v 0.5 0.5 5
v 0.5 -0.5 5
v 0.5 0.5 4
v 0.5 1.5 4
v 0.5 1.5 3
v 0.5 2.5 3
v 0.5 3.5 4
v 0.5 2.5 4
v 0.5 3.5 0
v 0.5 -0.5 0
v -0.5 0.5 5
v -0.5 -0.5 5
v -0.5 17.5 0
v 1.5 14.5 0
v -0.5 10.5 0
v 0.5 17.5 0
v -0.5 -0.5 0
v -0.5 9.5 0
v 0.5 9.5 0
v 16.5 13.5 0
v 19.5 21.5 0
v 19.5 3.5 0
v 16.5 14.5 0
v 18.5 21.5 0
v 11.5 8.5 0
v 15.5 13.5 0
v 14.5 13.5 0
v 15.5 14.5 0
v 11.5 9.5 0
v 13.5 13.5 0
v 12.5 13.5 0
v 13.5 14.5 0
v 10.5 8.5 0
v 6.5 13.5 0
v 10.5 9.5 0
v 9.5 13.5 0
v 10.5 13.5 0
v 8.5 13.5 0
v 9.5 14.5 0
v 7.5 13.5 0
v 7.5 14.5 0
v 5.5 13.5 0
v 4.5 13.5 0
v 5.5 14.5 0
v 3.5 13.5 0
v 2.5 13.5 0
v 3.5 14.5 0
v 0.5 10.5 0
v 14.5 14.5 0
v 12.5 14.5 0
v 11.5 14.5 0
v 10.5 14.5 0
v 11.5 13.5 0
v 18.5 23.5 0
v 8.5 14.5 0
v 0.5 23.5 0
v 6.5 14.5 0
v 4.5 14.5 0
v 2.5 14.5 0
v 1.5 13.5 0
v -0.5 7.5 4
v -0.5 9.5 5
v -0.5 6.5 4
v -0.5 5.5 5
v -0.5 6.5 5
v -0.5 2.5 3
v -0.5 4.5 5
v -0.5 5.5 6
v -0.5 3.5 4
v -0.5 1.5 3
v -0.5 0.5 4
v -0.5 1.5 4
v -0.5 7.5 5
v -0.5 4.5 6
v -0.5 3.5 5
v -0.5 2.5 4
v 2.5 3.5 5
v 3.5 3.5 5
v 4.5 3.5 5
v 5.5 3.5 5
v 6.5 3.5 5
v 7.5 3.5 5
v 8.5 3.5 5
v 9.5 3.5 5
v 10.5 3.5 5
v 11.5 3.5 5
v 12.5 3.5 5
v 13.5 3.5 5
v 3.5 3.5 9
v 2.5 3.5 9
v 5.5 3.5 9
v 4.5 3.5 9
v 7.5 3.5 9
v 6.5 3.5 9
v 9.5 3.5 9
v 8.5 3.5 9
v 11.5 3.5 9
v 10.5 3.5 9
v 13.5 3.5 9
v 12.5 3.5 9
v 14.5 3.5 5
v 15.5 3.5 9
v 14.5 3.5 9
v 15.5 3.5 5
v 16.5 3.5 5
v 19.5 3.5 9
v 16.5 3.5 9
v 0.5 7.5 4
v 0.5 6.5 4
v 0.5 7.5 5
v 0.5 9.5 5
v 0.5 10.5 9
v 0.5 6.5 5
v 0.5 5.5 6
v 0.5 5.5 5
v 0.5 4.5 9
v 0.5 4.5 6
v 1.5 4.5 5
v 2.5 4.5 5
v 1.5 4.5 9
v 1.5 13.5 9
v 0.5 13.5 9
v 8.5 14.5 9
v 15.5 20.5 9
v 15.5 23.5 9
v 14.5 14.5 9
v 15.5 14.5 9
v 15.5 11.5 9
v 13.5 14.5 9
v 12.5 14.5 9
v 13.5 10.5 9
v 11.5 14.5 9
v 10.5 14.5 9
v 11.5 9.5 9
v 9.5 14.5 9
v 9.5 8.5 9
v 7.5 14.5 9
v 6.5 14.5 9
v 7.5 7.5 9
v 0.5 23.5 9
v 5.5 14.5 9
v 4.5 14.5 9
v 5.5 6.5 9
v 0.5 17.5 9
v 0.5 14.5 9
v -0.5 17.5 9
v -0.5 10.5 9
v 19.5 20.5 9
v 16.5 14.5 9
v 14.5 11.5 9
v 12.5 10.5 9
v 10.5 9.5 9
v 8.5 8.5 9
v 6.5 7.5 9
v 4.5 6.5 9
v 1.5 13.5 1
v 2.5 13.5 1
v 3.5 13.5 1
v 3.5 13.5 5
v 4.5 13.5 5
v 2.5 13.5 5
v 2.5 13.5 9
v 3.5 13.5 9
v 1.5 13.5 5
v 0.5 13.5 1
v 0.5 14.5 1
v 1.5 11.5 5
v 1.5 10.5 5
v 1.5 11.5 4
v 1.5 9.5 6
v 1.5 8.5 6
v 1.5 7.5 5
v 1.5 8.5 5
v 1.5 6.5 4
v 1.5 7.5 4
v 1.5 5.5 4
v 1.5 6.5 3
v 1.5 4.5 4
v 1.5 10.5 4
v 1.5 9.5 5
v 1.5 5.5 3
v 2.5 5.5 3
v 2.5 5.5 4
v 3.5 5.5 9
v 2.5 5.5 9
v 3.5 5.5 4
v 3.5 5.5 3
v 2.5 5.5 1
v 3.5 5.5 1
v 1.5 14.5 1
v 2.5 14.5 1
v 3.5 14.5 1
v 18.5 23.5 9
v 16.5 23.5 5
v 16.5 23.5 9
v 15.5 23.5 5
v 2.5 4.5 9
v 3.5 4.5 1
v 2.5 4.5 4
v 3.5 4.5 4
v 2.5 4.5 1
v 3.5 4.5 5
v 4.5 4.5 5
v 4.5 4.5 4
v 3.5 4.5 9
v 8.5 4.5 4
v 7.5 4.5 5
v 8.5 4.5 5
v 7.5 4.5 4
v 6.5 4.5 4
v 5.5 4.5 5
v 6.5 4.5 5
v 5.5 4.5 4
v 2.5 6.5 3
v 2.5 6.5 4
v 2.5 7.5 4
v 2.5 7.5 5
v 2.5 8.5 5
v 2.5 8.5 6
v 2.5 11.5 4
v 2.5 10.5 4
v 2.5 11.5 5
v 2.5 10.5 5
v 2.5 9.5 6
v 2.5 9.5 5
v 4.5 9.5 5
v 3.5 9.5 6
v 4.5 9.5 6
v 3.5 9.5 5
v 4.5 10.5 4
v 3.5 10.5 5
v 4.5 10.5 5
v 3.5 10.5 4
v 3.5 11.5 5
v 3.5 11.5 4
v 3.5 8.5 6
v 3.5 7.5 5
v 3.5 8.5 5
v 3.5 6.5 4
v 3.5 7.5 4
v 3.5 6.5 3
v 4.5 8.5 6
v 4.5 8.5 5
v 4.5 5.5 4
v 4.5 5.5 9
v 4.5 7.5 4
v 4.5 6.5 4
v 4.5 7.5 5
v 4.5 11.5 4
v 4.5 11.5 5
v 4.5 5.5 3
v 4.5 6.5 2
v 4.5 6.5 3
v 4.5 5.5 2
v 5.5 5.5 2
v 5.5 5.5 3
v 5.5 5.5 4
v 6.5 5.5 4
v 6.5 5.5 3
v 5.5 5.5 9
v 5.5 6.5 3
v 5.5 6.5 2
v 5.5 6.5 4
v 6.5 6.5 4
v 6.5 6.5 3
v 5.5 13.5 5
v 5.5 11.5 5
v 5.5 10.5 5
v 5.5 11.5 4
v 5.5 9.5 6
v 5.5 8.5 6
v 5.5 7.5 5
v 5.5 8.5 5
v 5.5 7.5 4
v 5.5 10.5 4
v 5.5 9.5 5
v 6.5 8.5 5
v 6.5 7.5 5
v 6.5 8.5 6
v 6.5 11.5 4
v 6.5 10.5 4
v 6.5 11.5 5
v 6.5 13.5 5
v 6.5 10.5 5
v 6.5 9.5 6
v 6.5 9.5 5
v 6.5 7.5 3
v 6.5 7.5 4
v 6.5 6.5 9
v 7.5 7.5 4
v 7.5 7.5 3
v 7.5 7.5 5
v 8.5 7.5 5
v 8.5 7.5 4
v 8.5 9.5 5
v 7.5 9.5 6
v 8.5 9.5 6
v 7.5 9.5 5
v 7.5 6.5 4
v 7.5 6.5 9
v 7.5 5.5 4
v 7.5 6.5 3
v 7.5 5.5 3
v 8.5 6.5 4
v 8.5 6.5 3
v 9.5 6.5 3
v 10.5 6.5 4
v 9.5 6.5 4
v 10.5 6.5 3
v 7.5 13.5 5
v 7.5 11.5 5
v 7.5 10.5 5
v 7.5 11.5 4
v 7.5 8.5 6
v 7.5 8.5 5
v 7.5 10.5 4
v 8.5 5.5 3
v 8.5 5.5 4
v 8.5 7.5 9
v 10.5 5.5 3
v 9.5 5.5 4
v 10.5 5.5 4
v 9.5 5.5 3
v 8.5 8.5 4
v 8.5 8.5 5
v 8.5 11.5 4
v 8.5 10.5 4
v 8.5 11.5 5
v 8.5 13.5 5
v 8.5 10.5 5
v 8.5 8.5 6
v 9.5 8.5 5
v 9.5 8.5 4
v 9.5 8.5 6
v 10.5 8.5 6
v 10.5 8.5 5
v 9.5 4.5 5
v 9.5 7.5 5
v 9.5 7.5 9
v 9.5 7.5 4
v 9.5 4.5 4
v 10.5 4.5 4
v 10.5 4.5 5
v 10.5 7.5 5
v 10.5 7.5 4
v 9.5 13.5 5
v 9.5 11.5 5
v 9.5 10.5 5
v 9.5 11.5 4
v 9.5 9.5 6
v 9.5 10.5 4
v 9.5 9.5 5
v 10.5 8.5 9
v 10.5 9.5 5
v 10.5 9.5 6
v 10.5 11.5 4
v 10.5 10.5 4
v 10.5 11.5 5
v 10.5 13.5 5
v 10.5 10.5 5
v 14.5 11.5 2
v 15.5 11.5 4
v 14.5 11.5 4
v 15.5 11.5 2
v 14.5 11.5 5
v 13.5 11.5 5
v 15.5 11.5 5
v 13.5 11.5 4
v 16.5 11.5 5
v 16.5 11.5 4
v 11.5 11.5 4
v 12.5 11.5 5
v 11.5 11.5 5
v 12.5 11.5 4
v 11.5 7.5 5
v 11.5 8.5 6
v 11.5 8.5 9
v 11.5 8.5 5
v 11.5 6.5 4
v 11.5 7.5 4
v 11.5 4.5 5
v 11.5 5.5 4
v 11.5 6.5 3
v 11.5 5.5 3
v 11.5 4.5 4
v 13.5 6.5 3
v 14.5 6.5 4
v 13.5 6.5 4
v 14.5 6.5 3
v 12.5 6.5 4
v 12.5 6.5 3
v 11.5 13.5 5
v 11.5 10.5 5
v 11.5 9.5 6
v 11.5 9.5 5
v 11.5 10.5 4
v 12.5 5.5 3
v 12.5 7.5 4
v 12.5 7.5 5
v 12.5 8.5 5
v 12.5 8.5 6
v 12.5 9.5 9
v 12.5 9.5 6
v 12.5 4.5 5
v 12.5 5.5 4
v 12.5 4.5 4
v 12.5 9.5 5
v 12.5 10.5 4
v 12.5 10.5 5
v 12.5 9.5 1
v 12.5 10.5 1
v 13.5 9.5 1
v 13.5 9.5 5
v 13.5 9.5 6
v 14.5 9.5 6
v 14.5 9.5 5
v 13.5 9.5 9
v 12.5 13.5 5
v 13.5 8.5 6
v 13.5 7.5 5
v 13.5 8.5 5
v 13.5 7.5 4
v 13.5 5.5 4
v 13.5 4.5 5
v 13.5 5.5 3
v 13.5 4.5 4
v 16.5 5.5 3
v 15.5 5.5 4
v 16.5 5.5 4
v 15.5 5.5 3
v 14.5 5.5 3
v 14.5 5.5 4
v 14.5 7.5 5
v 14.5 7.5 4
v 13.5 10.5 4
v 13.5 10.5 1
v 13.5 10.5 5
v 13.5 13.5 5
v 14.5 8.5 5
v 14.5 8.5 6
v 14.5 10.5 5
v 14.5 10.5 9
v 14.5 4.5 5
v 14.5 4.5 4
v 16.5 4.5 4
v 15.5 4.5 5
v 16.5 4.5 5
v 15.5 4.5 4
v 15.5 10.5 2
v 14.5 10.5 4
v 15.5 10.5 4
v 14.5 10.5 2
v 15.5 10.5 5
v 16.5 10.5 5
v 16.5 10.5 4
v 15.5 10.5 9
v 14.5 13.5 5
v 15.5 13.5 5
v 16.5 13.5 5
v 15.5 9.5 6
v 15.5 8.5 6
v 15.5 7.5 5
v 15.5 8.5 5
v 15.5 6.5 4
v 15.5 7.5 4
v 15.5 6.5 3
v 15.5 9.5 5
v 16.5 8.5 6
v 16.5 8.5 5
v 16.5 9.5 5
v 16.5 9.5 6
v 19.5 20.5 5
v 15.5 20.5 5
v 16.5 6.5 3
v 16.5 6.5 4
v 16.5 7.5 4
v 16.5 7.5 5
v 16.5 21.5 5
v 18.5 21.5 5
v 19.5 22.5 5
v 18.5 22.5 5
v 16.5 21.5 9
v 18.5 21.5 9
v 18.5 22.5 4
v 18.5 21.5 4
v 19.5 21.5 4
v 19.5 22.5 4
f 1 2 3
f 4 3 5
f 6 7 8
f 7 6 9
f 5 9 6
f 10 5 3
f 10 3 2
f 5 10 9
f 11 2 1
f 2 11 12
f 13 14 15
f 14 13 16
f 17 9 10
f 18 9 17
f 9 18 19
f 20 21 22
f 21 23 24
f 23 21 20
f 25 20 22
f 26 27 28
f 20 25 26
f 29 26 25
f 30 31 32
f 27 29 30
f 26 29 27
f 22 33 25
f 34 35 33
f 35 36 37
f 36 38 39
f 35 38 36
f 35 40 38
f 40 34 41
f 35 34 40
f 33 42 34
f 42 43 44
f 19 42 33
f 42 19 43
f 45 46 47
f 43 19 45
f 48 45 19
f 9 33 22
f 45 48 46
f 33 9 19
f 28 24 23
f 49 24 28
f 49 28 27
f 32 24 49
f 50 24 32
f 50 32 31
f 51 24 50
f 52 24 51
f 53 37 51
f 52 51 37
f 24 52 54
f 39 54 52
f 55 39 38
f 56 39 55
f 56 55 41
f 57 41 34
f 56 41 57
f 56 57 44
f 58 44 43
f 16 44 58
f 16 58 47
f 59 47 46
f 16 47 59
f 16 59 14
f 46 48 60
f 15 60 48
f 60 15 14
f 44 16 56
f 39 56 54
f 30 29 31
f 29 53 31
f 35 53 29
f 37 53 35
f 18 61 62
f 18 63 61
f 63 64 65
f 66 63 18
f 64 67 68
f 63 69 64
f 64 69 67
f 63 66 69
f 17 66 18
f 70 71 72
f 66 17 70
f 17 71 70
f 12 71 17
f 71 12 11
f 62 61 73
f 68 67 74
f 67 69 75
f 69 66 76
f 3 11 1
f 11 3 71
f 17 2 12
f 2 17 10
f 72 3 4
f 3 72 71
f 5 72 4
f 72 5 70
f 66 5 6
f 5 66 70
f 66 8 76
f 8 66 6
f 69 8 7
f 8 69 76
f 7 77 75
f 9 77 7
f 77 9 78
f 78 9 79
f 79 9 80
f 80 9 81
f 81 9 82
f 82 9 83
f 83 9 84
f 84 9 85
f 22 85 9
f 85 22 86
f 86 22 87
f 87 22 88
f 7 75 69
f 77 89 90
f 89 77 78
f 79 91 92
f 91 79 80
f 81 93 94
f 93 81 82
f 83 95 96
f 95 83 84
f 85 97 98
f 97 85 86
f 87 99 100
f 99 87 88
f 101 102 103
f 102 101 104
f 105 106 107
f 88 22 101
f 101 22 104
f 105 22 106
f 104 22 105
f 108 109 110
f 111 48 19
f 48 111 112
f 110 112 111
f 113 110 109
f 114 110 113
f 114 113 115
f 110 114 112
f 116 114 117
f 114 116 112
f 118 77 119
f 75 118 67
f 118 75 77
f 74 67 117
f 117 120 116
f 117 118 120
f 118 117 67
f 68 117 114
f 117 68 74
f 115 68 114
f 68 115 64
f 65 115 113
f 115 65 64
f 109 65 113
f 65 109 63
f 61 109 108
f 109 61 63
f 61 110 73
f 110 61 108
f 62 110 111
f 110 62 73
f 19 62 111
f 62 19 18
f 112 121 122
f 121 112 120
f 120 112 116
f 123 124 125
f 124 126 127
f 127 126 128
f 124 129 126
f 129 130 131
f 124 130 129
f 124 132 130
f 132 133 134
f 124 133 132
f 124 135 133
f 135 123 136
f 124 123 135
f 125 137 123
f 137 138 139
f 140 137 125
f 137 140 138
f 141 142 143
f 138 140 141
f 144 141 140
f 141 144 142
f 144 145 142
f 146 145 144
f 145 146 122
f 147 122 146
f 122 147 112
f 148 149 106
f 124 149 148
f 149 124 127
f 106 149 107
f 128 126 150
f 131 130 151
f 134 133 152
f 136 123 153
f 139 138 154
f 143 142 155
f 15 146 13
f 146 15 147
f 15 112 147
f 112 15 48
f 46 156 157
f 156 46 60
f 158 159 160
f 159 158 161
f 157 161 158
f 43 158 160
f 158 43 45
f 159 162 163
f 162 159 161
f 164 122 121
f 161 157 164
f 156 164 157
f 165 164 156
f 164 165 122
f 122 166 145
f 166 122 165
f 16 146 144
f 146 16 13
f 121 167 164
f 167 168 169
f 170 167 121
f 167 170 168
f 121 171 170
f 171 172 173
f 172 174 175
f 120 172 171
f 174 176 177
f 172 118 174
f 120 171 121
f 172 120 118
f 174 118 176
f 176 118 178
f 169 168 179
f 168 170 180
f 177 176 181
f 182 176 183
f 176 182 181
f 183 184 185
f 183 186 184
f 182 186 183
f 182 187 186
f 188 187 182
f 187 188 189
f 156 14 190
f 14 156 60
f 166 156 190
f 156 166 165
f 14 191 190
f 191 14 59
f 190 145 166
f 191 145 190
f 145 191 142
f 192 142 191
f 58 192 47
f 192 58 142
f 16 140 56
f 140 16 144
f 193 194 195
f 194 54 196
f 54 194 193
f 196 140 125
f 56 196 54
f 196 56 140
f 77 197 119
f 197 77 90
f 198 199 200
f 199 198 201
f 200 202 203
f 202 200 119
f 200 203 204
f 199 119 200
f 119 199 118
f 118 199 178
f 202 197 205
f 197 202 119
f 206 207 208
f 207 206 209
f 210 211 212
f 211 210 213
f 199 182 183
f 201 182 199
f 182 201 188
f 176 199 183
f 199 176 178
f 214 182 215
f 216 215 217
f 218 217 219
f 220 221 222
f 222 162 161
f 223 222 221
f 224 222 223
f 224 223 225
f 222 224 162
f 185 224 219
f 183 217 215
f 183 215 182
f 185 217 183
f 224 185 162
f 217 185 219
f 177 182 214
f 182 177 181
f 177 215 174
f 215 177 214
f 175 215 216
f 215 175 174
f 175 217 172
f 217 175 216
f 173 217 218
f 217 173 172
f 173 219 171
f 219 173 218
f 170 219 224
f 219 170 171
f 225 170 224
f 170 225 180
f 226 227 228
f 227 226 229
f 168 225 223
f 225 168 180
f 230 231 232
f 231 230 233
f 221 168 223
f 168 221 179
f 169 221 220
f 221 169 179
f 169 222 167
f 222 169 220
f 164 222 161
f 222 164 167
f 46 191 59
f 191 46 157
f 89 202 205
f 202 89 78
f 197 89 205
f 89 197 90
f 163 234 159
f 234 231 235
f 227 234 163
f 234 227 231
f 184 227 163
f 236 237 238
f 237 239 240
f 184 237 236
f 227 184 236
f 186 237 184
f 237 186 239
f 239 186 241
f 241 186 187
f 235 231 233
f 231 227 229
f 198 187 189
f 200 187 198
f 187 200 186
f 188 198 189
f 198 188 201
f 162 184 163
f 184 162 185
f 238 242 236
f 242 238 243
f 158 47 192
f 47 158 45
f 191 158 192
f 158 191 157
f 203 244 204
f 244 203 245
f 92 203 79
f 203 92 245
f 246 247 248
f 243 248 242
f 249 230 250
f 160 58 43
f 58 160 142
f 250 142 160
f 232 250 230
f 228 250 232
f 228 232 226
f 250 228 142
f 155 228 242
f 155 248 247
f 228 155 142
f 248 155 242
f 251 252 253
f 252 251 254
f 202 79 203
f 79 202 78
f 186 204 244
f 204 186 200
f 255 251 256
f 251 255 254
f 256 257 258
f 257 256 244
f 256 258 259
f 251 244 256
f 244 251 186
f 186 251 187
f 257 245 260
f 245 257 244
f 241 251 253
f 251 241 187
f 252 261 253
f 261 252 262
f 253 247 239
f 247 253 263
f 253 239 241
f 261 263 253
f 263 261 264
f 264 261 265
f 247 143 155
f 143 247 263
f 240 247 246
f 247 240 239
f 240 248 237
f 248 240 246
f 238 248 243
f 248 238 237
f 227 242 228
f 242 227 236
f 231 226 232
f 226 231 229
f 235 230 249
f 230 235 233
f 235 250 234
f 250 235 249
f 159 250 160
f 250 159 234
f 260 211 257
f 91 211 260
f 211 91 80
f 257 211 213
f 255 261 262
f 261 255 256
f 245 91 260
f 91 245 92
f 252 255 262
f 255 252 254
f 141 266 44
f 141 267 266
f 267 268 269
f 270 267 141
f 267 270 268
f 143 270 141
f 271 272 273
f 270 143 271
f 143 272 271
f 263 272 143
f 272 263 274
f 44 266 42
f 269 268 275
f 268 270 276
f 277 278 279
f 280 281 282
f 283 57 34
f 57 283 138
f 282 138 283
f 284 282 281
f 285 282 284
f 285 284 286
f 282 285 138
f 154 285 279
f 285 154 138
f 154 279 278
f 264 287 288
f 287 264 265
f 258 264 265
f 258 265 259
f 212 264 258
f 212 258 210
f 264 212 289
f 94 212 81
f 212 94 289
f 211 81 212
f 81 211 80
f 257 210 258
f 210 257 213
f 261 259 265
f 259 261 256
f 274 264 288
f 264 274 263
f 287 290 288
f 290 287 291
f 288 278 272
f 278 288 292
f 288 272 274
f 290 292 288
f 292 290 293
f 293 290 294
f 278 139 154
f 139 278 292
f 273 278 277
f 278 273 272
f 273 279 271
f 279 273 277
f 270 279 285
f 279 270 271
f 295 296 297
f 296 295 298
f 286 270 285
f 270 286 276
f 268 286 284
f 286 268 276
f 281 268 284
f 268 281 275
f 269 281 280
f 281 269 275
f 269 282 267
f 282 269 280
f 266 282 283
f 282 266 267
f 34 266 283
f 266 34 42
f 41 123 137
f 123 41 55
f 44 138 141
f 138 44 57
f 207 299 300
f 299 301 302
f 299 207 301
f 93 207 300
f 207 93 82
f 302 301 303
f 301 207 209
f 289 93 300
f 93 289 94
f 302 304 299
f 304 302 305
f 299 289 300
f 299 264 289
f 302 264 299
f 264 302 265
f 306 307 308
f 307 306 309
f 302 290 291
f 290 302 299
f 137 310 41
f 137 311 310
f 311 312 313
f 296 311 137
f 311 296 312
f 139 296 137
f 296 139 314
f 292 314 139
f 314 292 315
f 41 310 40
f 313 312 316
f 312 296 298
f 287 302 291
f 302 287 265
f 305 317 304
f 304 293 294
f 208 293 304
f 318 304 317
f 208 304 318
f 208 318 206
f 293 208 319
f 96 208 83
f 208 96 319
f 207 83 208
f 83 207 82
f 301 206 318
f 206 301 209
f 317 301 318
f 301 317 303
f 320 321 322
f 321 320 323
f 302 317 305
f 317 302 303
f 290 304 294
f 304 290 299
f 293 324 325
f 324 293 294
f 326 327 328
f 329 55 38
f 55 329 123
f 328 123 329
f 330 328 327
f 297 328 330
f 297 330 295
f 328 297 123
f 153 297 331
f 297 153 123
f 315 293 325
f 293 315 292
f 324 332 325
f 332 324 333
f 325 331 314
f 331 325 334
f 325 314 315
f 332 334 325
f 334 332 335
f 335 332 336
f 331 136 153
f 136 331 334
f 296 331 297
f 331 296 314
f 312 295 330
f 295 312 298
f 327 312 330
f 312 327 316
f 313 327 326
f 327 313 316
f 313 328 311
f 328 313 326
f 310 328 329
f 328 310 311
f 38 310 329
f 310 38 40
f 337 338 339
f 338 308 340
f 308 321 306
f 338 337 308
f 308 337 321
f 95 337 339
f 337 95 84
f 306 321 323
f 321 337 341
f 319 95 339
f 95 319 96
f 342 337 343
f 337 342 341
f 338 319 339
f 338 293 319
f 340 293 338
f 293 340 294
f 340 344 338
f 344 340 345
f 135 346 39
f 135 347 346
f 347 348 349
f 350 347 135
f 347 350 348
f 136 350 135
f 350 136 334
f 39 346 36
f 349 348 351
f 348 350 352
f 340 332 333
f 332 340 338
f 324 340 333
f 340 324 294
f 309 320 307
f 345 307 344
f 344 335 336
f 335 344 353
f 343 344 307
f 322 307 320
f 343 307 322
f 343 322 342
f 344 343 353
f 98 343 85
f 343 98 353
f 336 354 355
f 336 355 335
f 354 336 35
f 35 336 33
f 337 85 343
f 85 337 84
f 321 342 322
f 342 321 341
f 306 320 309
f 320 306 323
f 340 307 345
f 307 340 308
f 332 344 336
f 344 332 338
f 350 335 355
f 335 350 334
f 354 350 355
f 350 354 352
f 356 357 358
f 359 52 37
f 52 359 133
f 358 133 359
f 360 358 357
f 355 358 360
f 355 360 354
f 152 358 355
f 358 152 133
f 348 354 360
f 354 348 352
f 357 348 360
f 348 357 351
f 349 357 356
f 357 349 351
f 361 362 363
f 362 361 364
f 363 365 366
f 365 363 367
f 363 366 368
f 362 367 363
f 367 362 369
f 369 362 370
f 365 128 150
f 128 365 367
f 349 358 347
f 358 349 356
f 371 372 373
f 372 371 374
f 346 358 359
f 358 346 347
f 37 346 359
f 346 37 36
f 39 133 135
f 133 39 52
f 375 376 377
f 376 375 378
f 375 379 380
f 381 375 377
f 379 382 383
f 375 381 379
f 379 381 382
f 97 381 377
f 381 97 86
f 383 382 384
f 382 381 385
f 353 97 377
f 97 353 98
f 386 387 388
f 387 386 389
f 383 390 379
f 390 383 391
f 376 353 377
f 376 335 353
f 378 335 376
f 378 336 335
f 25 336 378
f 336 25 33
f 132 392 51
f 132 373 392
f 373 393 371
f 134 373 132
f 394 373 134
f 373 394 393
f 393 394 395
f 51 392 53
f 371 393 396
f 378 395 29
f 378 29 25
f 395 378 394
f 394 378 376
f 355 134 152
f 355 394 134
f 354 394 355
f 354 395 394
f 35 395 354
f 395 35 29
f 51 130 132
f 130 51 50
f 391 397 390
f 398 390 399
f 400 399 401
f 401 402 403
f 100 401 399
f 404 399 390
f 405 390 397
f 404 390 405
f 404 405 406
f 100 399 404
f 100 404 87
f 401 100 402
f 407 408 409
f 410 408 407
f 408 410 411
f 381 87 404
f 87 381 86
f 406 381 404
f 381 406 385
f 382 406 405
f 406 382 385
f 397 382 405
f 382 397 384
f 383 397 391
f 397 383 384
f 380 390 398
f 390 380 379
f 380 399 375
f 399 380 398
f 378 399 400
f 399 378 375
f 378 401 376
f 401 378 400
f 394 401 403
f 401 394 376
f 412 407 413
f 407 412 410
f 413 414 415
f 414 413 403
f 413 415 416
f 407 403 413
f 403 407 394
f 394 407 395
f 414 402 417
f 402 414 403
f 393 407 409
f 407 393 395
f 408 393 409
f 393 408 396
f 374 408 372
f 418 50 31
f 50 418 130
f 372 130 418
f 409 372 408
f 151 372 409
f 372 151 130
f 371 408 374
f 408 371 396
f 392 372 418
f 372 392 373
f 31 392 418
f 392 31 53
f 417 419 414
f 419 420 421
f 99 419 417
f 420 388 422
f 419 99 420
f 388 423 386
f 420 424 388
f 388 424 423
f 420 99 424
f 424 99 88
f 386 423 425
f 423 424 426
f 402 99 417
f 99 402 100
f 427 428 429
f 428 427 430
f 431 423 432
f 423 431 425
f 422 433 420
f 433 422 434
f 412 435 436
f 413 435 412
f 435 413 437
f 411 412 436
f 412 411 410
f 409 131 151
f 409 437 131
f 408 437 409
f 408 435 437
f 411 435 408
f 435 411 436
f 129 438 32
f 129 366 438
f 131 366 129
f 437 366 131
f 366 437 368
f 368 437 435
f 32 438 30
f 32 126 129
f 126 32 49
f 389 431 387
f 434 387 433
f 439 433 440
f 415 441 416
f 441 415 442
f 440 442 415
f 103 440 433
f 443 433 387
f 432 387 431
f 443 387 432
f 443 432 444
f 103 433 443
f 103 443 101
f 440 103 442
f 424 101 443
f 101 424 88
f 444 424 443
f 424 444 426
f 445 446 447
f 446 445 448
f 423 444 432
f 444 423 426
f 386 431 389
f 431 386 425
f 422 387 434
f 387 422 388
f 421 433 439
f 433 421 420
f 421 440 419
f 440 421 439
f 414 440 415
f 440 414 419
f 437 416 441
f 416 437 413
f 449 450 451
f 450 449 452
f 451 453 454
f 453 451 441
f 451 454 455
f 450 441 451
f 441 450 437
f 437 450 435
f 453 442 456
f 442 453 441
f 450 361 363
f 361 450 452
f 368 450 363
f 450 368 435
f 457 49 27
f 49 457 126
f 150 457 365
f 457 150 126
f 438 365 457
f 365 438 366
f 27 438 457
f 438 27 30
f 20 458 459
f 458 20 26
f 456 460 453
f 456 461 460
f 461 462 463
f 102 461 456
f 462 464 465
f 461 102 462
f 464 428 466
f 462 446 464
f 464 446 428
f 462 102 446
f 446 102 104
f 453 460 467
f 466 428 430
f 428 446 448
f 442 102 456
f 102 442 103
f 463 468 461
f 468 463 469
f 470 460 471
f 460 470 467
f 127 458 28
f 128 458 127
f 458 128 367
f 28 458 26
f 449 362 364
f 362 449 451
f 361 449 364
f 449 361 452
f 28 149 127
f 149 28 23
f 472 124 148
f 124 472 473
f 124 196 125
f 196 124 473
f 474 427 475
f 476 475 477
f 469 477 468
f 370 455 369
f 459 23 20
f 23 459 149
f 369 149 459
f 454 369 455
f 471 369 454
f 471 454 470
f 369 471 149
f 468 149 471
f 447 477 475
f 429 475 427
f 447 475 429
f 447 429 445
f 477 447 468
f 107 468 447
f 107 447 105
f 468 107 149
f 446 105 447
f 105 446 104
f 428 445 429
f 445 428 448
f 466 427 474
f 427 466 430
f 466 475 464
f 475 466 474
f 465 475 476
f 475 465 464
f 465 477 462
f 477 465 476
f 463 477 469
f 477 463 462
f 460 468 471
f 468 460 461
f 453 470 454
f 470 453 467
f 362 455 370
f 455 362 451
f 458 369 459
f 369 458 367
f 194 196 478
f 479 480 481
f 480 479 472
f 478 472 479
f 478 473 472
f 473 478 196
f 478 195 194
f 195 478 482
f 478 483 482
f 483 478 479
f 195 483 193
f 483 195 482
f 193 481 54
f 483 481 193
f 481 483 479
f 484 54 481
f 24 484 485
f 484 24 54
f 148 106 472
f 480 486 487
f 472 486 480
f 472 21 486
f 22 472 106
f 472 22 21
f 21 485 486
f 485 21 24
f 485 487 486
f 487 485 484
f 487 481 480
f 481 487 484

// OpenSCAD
union() {
    translate([0, 0, 2.5]) cube([1, 1, 5], center=true);
    translate([0, 1, 2.0]) cube([1, 1, 4], center=true);
    translate([0, 2, 1.5]) cube([1, 1, 3], center=true);
    translate([0, 3, 2.0]) cube([1, 1, 4], center=true);
    translate([0, 4, 2.5]) cube([1, 1, 5], center=true);
    translate([0, 5, 3.0]) cube([1, 1, 6], center=true);
    translate([0, 6, 2.5]) cube([1, 1, 5], center=true);
    translate([0, 7, 2.0]) cube([1, 1, 4], center=true);
    translate([0, 8, 2.5]) cube([1, 1, 5], center=true);
    translate([0, 9, 2.5]) cube([1, 1, 5], center=true);
    translate([0, 11, 4.5]) cube([1, 1, 9], center=true);
    translate([0, 12, 4.5]) cube([1, 1, 9], center=true);
    translate([0, 13, 4.5]) cube([1, 1, 9], center=true);
    translate([0, 14, 4.5]) cube([1, 1, 9], center=true);
    translate([0, 15, 4.5]) cube([1, 1, 9], center=true);
    translate([0, 16, 4.5]) cube([1, 1, 9], center=true);
    translate([0, 17, 4.5]) cube([1, 1, 9], center=true);
    translate([1, 4, 2.5]) cube([1, 1, 5], center=true);
    translate([1, 5, 4.5]) cube([1, 1, 9], center=true);
    translate([1, 6, 4.5]) cube([1, 1, 9], center=true);
    translate([1, 7, 4.5]) cube([1, 1, 9], center=true);
    translate([1, 8, 4.5]) cube([1, 1, 9], center=true);
    translate([1, 9, 4.5]) cube([1, 1, 9], center=true);
    translate([1, 10, 4.5]) cube([1, 1, 9], center=true);
    translate([1, 11, 4.5]) cube([1, 1, 9], center=true);
    translate([1, 12, 4.5]) cube([1, 1, 9], center=true);
    translate([1, 13, 4.5]) cube([1, 1, 9], center=true);
    translate([1, 14, 0.5]) cube([1, 1, 1], center=true);
    translate([1, 15, 4.5]) cube([1, 1, 9], center=true);
    translate([1, 16, 4.5]) cube([1, 1, 9], center=true);
    translate([1, 17, 4.5]) cube([1, 1, 9], center=true);
    translate([1, 18, 4.5]) cube([1, 1, 9], center=true);
    translate([1, 19, 4.5]) cube([1, 1, 9], center=true);
    translate([1, 20, 4.5]) cube([1, 1, 9], center=true);
    translate([1, 21, 4.5]) cube([1, 1, 9], center=true);
    translate([1, 22, 4.5]) cube([1, 1, 9], center=true);
    translate([1, 23, 4.5]) cube([1, 1, 9], center=true);
    translate([2, 4, 2.5]) cube([1, 1, 5], center=true);
    translate([2, 5, 2.0]) cube([1, 1, 4], center=true);
    translate([2, 6, 1.5]) cube([1, 1, 3], center=true);
    translate([2, 7, 2.0]) cube([1, 1, 4], center=true);
    translate([2, 8, 2.5]) cube([1, 1, 5], center=true);
    translate([2, 9, 3.0]) cube([1, 1, 6], center=true);
    translate([2, 10, 2.5]) cube([1, 1, 5], center=true);
    translate([2, 11, 2.0]) cube([1, 1, 4], center=true);
    translate([2, 12, 2.5]) cube([1, 1, 5], center=true);
    translate([2, 13, 2.5]) cube([1, 1, 5], center=true);
    translate([2, 15, 4.5]) cube([1, 1, 9], center=true);
    translate([2, 16, 4.5]) cube([1, 1, 9], center=true);
    translate([2, 17, 4.5]) cube([1, 1, 9], center=true);
    translate([2, 18, 4.5]) cube([1, 1, 9], center=true);
    translate([2, 19, 4.5]) cube([1, 1, 9], center=true);
    translate([2, 20, 4.5]) cube([1, 1, 9], center=true);
    translate([2, 21, 4.5]) cube([1, 1, 9], center=true);
    translate([2, 22, 4.5]) cube([1, 1, 9], center=true);
    translate([2, 23, 4.5]) cube([1, 1, 9], center=true);
    translate([3, 4, 4.5]) cube([1, 1, 9], center=true);
    translate([3, 5, 0.5]) cube([1, 1, 1], center=true);
    translate([3, 6, 4.5]) cube([1, 1, 9], center=true);
    translate([3, 7, 4.5]) cube([1, 1, 9], center=true);
    translate([3, 8, 4.5]) cube([1, 1, 9], center=true);
    translate([3, 9, 4.5]) cube([1, 1, 9], center=true);
    translate([3, 10, 4.5]) cube([1, 1, 9], center=true);
    translate([3, 11, 4.5]) cube([1, 1, 9], center=true);
    translate([3, 12, 4.5]) cube([1, 1, 9], center=true);
    translate([3, 13, 4.5]) cube([1, 1, 9], center=true);
    translate([3, 14, 0.5]) cube([1, 1, 1], center=true);
    translate([3, 15, 4.5]) cube([1, 1, 9], center=true);
    translate([3, 16, 4.5]) cube([1, 1, 9], center=true);
    translate([3, 17, 4.5]) cube([1, 1, 9], center=true);
    translate([3, 18, 4.5]) cube([1, 1, 9], center=true);
    translate([3, 19, 4.5]) cube([1, 1, 9], center=true);
    translate([3, 20, 4.5]) cube([1, 1, 9], center=true);
    translate([3, 21, 4.5]) cube([1, 1, 9], center=true);
    translate([3, 22, 4.5]) cube([1, 1, 9], center=true);
    translate([3, 23, 4.5]) cube([1, 1, 9], center=true);
    translate([4, 4, 2.5]) cube([1, 1, 5], center=true);
    translate([4, 5, 2.0]) cube([1, 1, 4], center=true);
    translate([4, 6, 1.5]) cube([1, 1, 3], center=true);
    translate([4, 7, 2.0]) cube([1, 1, 4], center=true);
    translate([4, 8, 2.5]) cube([1, 1, 5], center=true);
    translate([4, 9, 3.0]) cube([1, 1, 6], center=true);
    translate([4, 10, 2.5]) cube([1, 1, 5], center=true);
    translate([4, 11, 2.0]) cube([1, 1, 4], center=true);
    translate([4, 12, 2.5]) cube([1, 1, 5], center=true);
    translate([4, 13, 2.5]) cube([1, 1, 5], center=true);
    translate([4, 15, 4.5]) cube([1, 1, 9], center=true);
    translate([4, 16, 4.5]) cube([1, 1, 9], center=true);
    translate([4, 17, 4.5]) cube([1, 1, 9], center=true);
    translate([4, 18, 4.5]) cube([1, 1, 9], center=true);
    translate([4, 19, 4.5]) cube([1, 1, 9], center=true);
    translate([4, 20, 4.5]) cube([1, 1, 9], center=true);
    translate([4, 21, 4.5]) cube([1, 1, 9], center=true);
    translate([4, 22, 4.5]) cube([1, 1, 9], center=true);
    translate([4, 23, 4.5]) cube([1, 1, 9], center=true);
    translate([5, 4, 4.5]) cube([1, 1, 9], center=true);
    translate([5, 5, 4.5]) cube([1, 1, 9], center=true);
    translate([5, 6, 1.0]) cube([1, 1, 2], center=true);
    translate([5, 7, 4.5]) cube([1, 1, 9], center=true);
    translate([5, 8, 4.5]) cube([1, 1, 9], center=true);
    translate([5, 9, 4.5]) cube([1, 1, 9], center=true);
    translate([5, 10, 4.5]) cube([1, 1, 9], center=true);
    translate([5, 11, 4.5]) cube([1, 1, 9], center=true);
    translate([5, 12, 4.5]) cube([1, 1, 9], center=true);
    translate([5, 13, 4.5]) cube([1, 1, 9], center=true);
    translate([5, 14, 4.5]) cube([1, 1, 9], center=true);
    translate([5, 15, 4.5]) cube([1, 1, 9], center=true);
    translate([5, 16, 4.5]) cube([1, 1, 9], center=true);
    translate([5, 17, 4.5]) cube([1, 1, 9], center=true);
    translate([5, 18, 4.5]) cube([1, 1, 9], center=true);
    translate([5, 19, 4.5]) cube([1, 1, 9], center=true);
    translate([5, 20, 4.5]) cube([1, 1, 9], center=true);
    translate([5, 21, 4.5]) cube([1, 1, 9], center=true);
    translate([5, 22, 4.5]) cube([1, 1, 9], center=true);
    translate([5, 23, 4.5]) cube([1, 1, 9], center=true);
    translate([6, 4, 2.5]) cube([1, 1, 5], center=true);
    translate([6, 5, 2.0]) cube([1, 1, 4], center=true);
    translate([6, 6, 1.5]) cube([1, 1, 3], center=true);
    translate([6, 7, 2.0]) cube([1, 1, 4], center=true);
    translate([6, 8, 2.5]) cube([1, 1, 5], center=true);
    translate([6, 9, 3.0]) cube([1, 1, 6], center=true);
    translate([6, 10, 2.5]) cube([1, 1, 5], center=true);
    translate([6, 11, 2.0]) cube([1, 1, 4], center=true);
    translate([6, 12, 2.5]) cube([1, 1, 5], center=true);
    translate([6, 13, 2.5]) cube([1, 1, 5], center=true);
    translate([6, 15, 4.5]) cube([1, 1, 9], center=true);
    translate([6, 16, 4.5]) cube([1, 1, 9], center=true);
    translate([6, 17, 4.5]) cube([1, 1, 9], center=true);
    translate([6, 18, 4.5]) cube([1, 1, 9], center=true);
    translate([6, 19, 4.5]) cube([1, 1, 9], center=true);
    translate([6, 20, 4.5]) cube([1, 1, 9], center=true);
    translate([6, 21, 4.5]) cube([1, 1, 9], center=true);
    translate([6, 22, 4.5]) cube([1, 1, 9], center=true);
    translate([6, 23, 4.5]) cube([1, 1, 9], center=true);
    translate([7, 4, 4.5]) cube([1, 1, 9], center=true);
    translate([7, 5, 4.5]) cube([1, 1, 9], center=true);
    translate([7, 6, 4.5]) cube([1, 1, 9], center=true);
    translate([7, 7, 1.5]) cube([1, 1, 3], center=true);
    translate([7, 8, 4.5]) cube([1, 1, 9], center=true);
    translate([7, 9, 4.5]) cube([1, 1, 9], center=true);
    translate([7, 10, 4.5]) cube([1, 1, 9], center=true);
    translate([7, 11, 4.5]) cube([1, 1, 9], center=true);
    translate([7, 12, 4.5]) cube([1, 1, 9], center=true);
    translate([7, 13, 4.5]) cube([1, 1, 9], center=true);
    translate([7, 14, 4.5]) cube([1, 1, 9], center=true);
    translate([7, 15, 4.5]) cube([1, 1, 9], center=true);
    translate([7, 16, 4.5]) cube([1, 1, 9], center=true);
    translate([7, 17, 4.5]) cube([1, 1, 9], center=true);
    translate([7, 18, 4.5]) cube([1, 1, 9], center=true);
    translate([7, 19, 4.5]) cube([1, 1, 9], center=true);
    translate([7, 20, 4.5]) cube([1, 1, 9], center=true);
    translate([7, 21, 4.5]) cube([1, 1, 9], center=true);
    translate([7, 22, 4.5]) cube([1, 1, 9], center=true);
    translate([7, 23, 4.5]) cube([1, 1, 9], center=true);
    translate([8, 4, 2.5]) cube([1, 1, 5], center=true);
    translate([8, 5, 2.0]) cube([1, 1, 4], center=true);
    translate([8, 6, 1.5]) cube([1, 1, 3], center=true);
    translate([8, 7, 2.0]) cube([1, 1, 4], center=true);
    translate([8, 8, 2.5]) cube([1, 1, 5], center=true);
    translate([8, 9, 3.0]) cube([1, 1, 6], center=true);
    translate([8, 10, 2.5]) cube([1, 1, 5], center=true);
    translate([8, 11, 2.0]) cube([1, 1, 4], center=true);
    translate([8, 12, 2.5]) cube([1, 1, 5], center=true);
    translate([8, 13, 2.5]) cube([1, 1, 5], center=true);
    translate([8, 15, 4.5]) cube([1, 1, 9], center=true);
    translate([8, 16, 4.5]) cube([1, 1, 9], center=true);
    translate([8, 17, 4.5]) cube([1, 1, 9], center=true);
    translate([8, 18, 4.5]) cube([1, 1, 9], center=true);
    translate([8, 19, 4.5]) cube([1, 1, 9], center=true);
    translate([8, 20, 4.5]) cube([1, 1, 9], center=true);
    translate([8, 21, 4.5]) cube([1, 1, 9], center=true);
    translate([8, 22, 4.5]) cube([1, 1, 9], center=true);
    translate([8, 23, 4.5]) cube([1, 1, 9], center=true);
    translate([9, 4, 4.5]) cube([1, 1, 9], center=true);
    translate([9, 5, 4.5]) cube([1, 1, 9], center=true);
    translate([9, 6, 4.5]) cube([1, 1, 9], center=true);
    translate([9, 7, 4.5]) cube([1, 1, 9], center=true);
    translate([9, 8, 2.0]) cube([1, 1, 4], center=true);
    translate([9, 9, 4.5]) cube([1, 1, 9], center=true);
    translate([9, 10, 4.5]) cube([1, 1, 9], center=true);
    translate([9, 11, 4.5]) cube([1, 1, 9], center=true);
    translate([9, 12, 4.5]) cube([1, 1, 9], center=true);
    translate([9, 13, 4.5]) cube([1, 1, 9], center=true);
    translate([9, 14, 4.5]) cube([1, 1, 9], center=true);
    translate([9, 15, 4.5]) cube([1, 1, 9], center=true);
    translate([9, 16, 4.5]) cube([1, 1, 9], center=true);
    translate([9, 17, 4.5]) cube([1, 1, 9], center=true);
    translate([9, 18, 4.5]) cube([1, 1, 9], center=true);
    translate([9, 19, 4.5]) cube([1, 1, 9], center=true);
    translate([9, 20, 4.5]) cube([1, 1, 9], center=true);
    translate([9, 21, 4.5]) cube([1, 1, 9], center=true);
    translate([9, 22, 4.5]) cube([1, 1, 9], center=true);
    translate([9, 23, 4.5]) cube([1, 1, 9], center=true);
    translate([10, 4, 2.5]) cube([1, 1, 5], center=true);
    translate([10, 5, 2.0]) cube([1, 1, 4], center=true);
    translate([10, 6, 1.5]) cube([1, 1, 3], center=true);
    translate([10, 7, 2.0]) cube([1, 1, 4], center=true);
    translate([10, 8, 2.5]) cube([1, 1, 5], center=true);
    translate([10, 9, 3.0]) cube([1, 1, 6], center=true);
    translate([10, 10, 2.5]) cube([1, 1, 5], center=true);
    translate([10, 11, 2.0]) cube([1, 1, 4], center=true);
    translate([10, 12, 2.5]) cube([1, 1, 5], center=true);
    translate([10, 13, 2.5]) cube([1, 1, 5], center=true);
    translate([10, 15, 4.5]) cube([1, 1, 9], center=true);
    translate([10, 16, 4.5]) cube([1, 1, 9], center=true);
    translate([10, 17, 4.5]) cube([1, 1, 9], center=true);
    translate([10, 18, 4.5]) cube([1, 1, 9], center=true);
    translate([10, 19, 4.5]) cube([1, 1, 9], center=true);
    translate([10, 20, 4.5]) cube([1, 1, 9], center=true);
    translate([10, 21, 4.5]) cube([1, 1, 9], center=true);
    translate([10, 22, 4.5]) cube([1, 1, 9], center=true);
    translate([10, 23, 4.5]) cube([1, 1, 9], center=true);
    translate([11, 4, 4.5]) cube([1, 1, 9], center=true);
    translate([11, 5, 4.5]) cube([1, 1, 9], center=true);
    translate([11, 6, 4.5]) cube([1, 1, 9], center=true);
    translate([11, 7, 4.5]) cube([1, 1, 9], center=true);
    translate([11, 8, 4.5]) cube([1, 1, 9], center=true);
    translate([11, 10, 4.5]) cube([1, 1, 9], center=true);
    translate([11, 11, 4.5]) cube([1, 1, 9], center=true);
    translate([11, 12, 4.5]) cube([1, 1, 9], center=true);
    translate([11, 13, 4.5]) cube([1, 1, 9], center=true);
    translate([11, 14, 4.5]) cube([1, 1, 9], center=true);
    translate([11, 15, 4.5]) cube([1, 1, 9], center=true);
    translate([11, 16, 4.5]) cube([1, 1, 9], center=true);
    translate([11, 17, 4.5]) cube([1, 1, 9], center=true);
    translate([11, 18, 4.5]) cube([1, 1, 9], center=true);
    translate([11, 19, 4.5]) cube([1, 1, 9], center=true);
    translate([11, 20, 4.5]) cube([1, 1, 9], center=true);
    translate([11, 21, 4.5]) cube([1, 1, 9], center=true);
    translate([11, 22, 4.5]) cube([1, 1, 9], center=true);
    translate([11, 23, 4.5]) cube([1, 1, 9], center=true);
    translate([12, 4, 2.5]) cube([1, 1, 5], center=true);
    translate([12, 5, 2.0]) cube([1, 1, 4], center=true);
    translate([12, 6, 1.5]) cube([1, 1, 3], center=true);
    translate([12, 7, 2.0]) cube([1, 1, 4], center=true);
    translate([12, 8, 2.5]) cube([1, 1, 5], center=true);
    translate([12, 9, 3.0]) cube([1, 1, 6], center=true);
    translate([12, 10, 2.5]) cube([1, 1, 5], center=true);
    translate([12, 11, 2.0]) cube([1, 1, 4], center=true);
    translate([12, 12, 2.5]) cube([1, 1, 5], center=true);
    translate([12, 13, 2.5]) cube([1, 1, 5], center=true);
    translate([12, 15, 4.5]) cube([1, 1, 9], center=true);
    translate([12, 16, 4.5]) cube([1, 1, 9], center=true);
    translate([12, 17, 4.5]) cube([1, 1, 9], center=true);
    translate([12, 18, 4.5]) cube([1, 1, 9], center=true);
    translate([12, 19, 4.5]) cube([1, 1, 9], center=true);
    translate([12, 20, 4.5]) cube([1, 1, 9], center=true);
    translate([12, 21, 4.5]) cube([1, 1, 9], center=true);
    translate([12, 22, 4.5]) cube([1, 1, 9], center=true);
    translate([12, 23, 4.5]) cube([1, 1, 9], center=true);
    translate([13, 4, 4.5]) cube([1, 1, 9], center=true);
    translate([13, 5, 4.5]) cube([1, 1, 9], center=true);
    translate([13, 6, 4.5]) cube([1, 1, 9], center=true);
    translate([13, 7, 4.5]) cube([1, 1, 9], center=true);
    translate([13, 8, 4.5]) cube([1, 1, 9], center=true);
    translate([13, 9, 4.5]) cube([1, 1, 9], center=true);
    translate([13, 10, 0.5]) cube([1, 1, 1], center=true);
    translate([13, 11, 4.5]) cube([1, 1, 9], center=true);
    translate([13, 12, 4.5]) cube([1, 1, 9], center=true);
    translate([13, 13, 4.5]) cube([1, 1, 9], center=true);
    translate([13, 14, 4.5]) cube([1, 1, 9], center=true);
    translate([13, 15, 4.5]) cube([1, 1, 9], center=true);
    translate([13, 16, 4.5]) cube([1, 1, 9], center=true);
    translate([13, 17, 4.5]) cube([1, 1, 9], center=true);
    translate([13, 18, 4.5]) cube([1, 1, 9], center=true);
    translate([13, 19, 4.5]) cube([1, 1, 9], center=true);
    translate([13, 20, 4.5]) cube([1, 1, 9], center=true);
    translate([13, 21, 4.5]) cube([1, 1, 9], center=true);
    translate([13, 22, 4.5]) cube([1, 1, 9], center=true);
    translate([13, 23, 4.5]) cube([1, 1, 9], center=true);
    translate([14, 4, 2.5]) cube([1, 1, 5], center=true);
    translate([14, 5, 2.0]) cube([1, 1, 4], center=true);
    translate([14, 6, 1.5]) cube([1, 1, 3], center=true);
    translate([14, 7, 2.0]) cube([1, 1, 4], center=true);
    translate([14, 8, 2.5]) cube([1, 1, 5], center=true);
    translate([14, 9, 3.0]) cube([1, 1, 6], center=true);
    translate([14, 10, 2.5]) cube([1, 1, 5], center=true);
    translate([14, 11, 2.0]) cube([1, 1, 4], center=true);
    translate([14, 12, 2.5]) cube([1, 1, 5], center=true);
    translate([14, 13, 2.5]) cube([1, 1, 5], center=true);
    translate([14, 15, 4.5]) cube([1, 1, 9], center=true);
    translate([14, 16, 4.5]) cube([1, 1, 9], center=true);
    translate([14, 17, 4.5]) cube([1, 1, 9], center=true);
    translate([14, 18, 4.5]) cube([1, 1, 9], center=true);
    translate([14, 19, 4.5]) cube([1, 1, 9], center=true);
    translate([14, 20, 4.5]) cube([1, 1, 9], center=true);
    translate([14, 21, 4.5]) cube([1, 1, 9], center=true);
    translate([14, 22, 4.5]) cube([1, 1, 9], center=true);
    translate([14, 23, 4.5]) cube([1, 1, 9], center=true);
    translate([15, 4, 4.5]) cube([1, 1, 9], center=true);
    translate([15, 5, 4.5]) cube([1, 1, 9], center=true);
    translate([15, 6, 4.5]) cube([1, 1, 9], center=true);
    translate([15, 7, 4.5]) cube([1, 1, 9], center=true);
    translate([15, 8, 4.5]) cube([1, 1, 9], center=true);
    translate([15, 9, 4.5]) cube([1, 1, 9], center=true);
    translate([15, 10, 4.5]) cube([1, 1, 9], center=true);
    translate([15, 11, 1.0]) cube([1, 1, 2], center=true);
    translate([15, 12, 4.5]) cube([1, 1, 9], center=true);
    translate([15, 13, 4.5]) cube([1, 1, 9], center=true);
    translate([15, 14, 4.5]) cube([1, 1, 9], center=true);
    translate([15, 15, 4.5]) cube([1, 1, 9], center=true);
    translate([15, 16, 4.5]) cube([1, 1, 9], center=true);
    translate([15, 17, 4.5]) cube([1, 1, 9], center=true);
    translate([15, 18, 4.5]) cube([1, 1, 9], center=true);
    translate([15, 19, 4.5]) cube([1, 1, 9], center=true);
    translate([15, 20, 4.5]) cube([1, 1, 9], center=true);
    translate([15, 21, 4.5]) cube([1, 1, 9], center=true);
    translate([15, 22, 4.5]) cube([1, 1, 9], center=true);
    translate([15, 23, 4.5]) cube([1, 1, 9], center=true);
    translate([16, 4, 2.5]) cube([1, 1, 5], center=true);
    translate([16, 5, 2.0]) cube([1, 1, 4], center=true);
    translate([16, 6, 1.5]) cube([1, 1, 3], center=true);
    translate([16, 7, 2.0]) cube([1, 1, 4], center=true);
    translate([16, 8, 2.5]) cube([1, 1, 5], center=true);
    translate([16, 9, 3.0]) cube([1, 1, 6], center=true);
    translate([16, 10, 2.5]) cube([1, 1, 5], center=true);
    translate([16, 11, 2.0]) cube([1, 1, 4], center=true);
    translate([16, 12, 2.5]) cube([1, 1, 5], center=true);
    translate([16, 13, 2.5]) cube([1, 1, 5], center=true);
    translate([16, 15, 4.5]) cube([1, 1, 9], center=true);
    translate([16, 16, 4.5]) cube([1, 1, 9], center=true);
    translate([16, 17, 4.5]) cube([1, 1, 9], center=true);
    translate([16, 18, 4.5]) cube([1, 1, 9], center=true);
    translate([16, 19, 4.5]) cube([1, 1, 9], center=true);
    translate([16, 20, 4.5]) cube([1, 1, 9], center=true);
    translate([16, 21, 2.5]) cube([1, 1, 5], center=true);
    translate([16, 22, 2.5]) cube([1, 1, 5], center=true);
    translate([16, 23, 2.5]) cube([1, 1, 5], center=true);
    translate([17, 4, 4.5]) cube([1, 1, 9], center=true);
    translate([17, 5, 4.5]) cube([1, 1, 9], center=true);
    translate([17, 6, 4.5]) cube([1, 1, 9], center=true);
    translate([17, 7, 4.5]) cube([1, 1, 9], center=true);
    translate([17, 8, 4.5]) cube([1, 1, 9], center=true);
    translate([17, 9, 4.5]) cube([1, 1, 9], center=true);
    translate([17, 10, 4.5]) cube([1, 1, 9], center=true);
    translate([17, 11, 4.5]) cube([1, 1, 9], center=true);
    translate([17, 12, 4.5]) cube([1, 1, 9], center=true);
    translate([17, 13, 4.5]) cube([1, 1, 9], center=true);
    translate([17, 14, 4.5]) cube([1, 1, 9], center=true);
    translate([17, 15, 4.5]) cube([1, 1, 9], center=true);
    translate([17, 16, 4.5]) cube([1, 1, 9], center=true);
    translate([17, 17, 4.5]) cube([1, 1, 9], center=true);
    translate([17, 18, 4.5]) cube([1, 1, 9], center=true);
    translate([17, 19, 4.5]) cube([1, 1, 9], center=true);
    translate([17, 20, 4.5]) cube([1, 1, 9], center=true);
    translate([17, 21, 2.5]) cube([1, 1, 5], center=true);
    translate([17, 22, 4.5]) cube([1, 1, 9], center=true);
    translate([17, 23, 4.5]) cube([1, 1, 9], center=true);
    translate([18, 4, 4.5]) cube([1, 1, 9], center=true);
    translate([18, 5, 4.5]) cube([1, 1, 9], center=true);
    translate([18, 6, 4.5]) cube([1, 1, 9], center=true);
    translate([18, 7, 4.5]) cube([1, 1, 9], center=true);
    translate([18, 8, 4.5]) cube([1, 1, 9], center=true);
    translate([18, 9, 4.5]) cube([1, 1, 9], center=true);
    translate([18, 10, 4.5]) cube([1, 1, 9], center=true);
    translate([18, 11, 4.5]) cube([1, 1, 9], center=true);
    translate([18, 12, 4.5]) cube([1, 1, 9], center=true);
    translate([18, 13, 4.5]) cube([1, 1, 9], center=true);
    translate([18, 14, 4.5]) cube([1, 1, 9], center=true);
    translate([18, 15, 4.5]) cube([1, 1, 9], center=true);
    translate([18, 16, 4.5]) cube([1, 1, 9], center=true);
    translate([18, 17, 4.5]) cube([1, 1, 9], center=true);
    translate([18, 18, 4.5]) cube([1, 1, 9], center=true);
    translate([18, 19, 4.5]) cube([1, 1, 9], center=true);
    translate([18, 20, 4.5]) cube([1, 1, 9], center=true);
    translate([18, 21, 2.5]) cube([1, 1, 5], center=true);
    translate([18, 22, 4.5]) cube([1, 1, 9], center=true);
    translate([18, 23, 4.5]) cube([1, 1, 9], center=true);
    translate([19, 4, 4.5]) cube([1, 1, 9], center=true);
    translate([19, 5, 4.5]) cube([1, 1, 9], center=true);
    translate([19, 6, 4.5]) cube([1, 1, 9], center=true);
    translate([19, 7, 4.5]) cube([1, 1, 9], center=true);
    translate([19, 8, 4.5]) cube([1, 1, 9], center=true);
    translate([19, 9, 4.5]) cube([1, 1, 9], center=true);
    translate([19, 10, 4.5]) cube([1, 1, 9], center=true);
    translate([19, 11, 4.5]) cube([1, 1, 9], center=true);
    translate([19, 12, 4.5]) cube([1, 1, 9], center=true);
    translate([19, 13, 4.5]) cube([1, 1, 9], center=true);
    translate([19, 14, 4.5]) cube([1, 1, 9], center=true);
    translate([19, 15, 4.5]) cube([1, 1, 9], center=true);
    translate([19, 16, 4.5]) cube([1, 1, 9], center=true);
    translate([19, 17, 4.5]) cube([1, 1, 9], center=true);
    translate([19, 18, 4.5]) cube([1, 1, 9], center=true);
    translate([19, 19, 4.5]) cube([1, 1, 9], center=true);
    translate([19, 20, 4.5]) cube([1, 1, 9], center=true);
    translate([19, 21, 2.5]) cube([1, 1, 5], center=true);
    translate([19, 22, 4.5]) color([0, 0, 1]) cube([1, 1, 1], center=true);
}
